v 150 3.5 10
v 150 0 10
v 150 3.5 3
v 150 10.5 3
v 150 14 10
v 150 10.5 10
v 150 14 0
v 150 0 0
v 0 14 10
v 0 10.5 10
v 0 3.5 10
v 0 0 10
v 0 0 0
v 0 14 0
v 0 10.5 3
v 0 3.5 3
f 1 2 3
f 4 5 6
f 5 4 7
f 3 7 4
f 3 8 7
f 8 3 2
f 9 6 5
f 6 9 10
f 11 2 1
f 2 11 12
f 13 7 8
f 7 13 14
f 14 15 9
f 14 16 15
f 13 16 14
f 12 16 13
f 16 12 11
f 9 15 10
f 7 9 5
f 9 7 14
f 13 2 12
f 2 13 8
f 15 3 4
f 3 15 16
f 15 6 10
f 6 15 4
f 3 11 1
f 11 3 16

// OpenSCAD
$fn=100;

difference()
{
	cube([150,14,10]);
	translate([0,3.5,3]) cube([150,7,7]);
}
